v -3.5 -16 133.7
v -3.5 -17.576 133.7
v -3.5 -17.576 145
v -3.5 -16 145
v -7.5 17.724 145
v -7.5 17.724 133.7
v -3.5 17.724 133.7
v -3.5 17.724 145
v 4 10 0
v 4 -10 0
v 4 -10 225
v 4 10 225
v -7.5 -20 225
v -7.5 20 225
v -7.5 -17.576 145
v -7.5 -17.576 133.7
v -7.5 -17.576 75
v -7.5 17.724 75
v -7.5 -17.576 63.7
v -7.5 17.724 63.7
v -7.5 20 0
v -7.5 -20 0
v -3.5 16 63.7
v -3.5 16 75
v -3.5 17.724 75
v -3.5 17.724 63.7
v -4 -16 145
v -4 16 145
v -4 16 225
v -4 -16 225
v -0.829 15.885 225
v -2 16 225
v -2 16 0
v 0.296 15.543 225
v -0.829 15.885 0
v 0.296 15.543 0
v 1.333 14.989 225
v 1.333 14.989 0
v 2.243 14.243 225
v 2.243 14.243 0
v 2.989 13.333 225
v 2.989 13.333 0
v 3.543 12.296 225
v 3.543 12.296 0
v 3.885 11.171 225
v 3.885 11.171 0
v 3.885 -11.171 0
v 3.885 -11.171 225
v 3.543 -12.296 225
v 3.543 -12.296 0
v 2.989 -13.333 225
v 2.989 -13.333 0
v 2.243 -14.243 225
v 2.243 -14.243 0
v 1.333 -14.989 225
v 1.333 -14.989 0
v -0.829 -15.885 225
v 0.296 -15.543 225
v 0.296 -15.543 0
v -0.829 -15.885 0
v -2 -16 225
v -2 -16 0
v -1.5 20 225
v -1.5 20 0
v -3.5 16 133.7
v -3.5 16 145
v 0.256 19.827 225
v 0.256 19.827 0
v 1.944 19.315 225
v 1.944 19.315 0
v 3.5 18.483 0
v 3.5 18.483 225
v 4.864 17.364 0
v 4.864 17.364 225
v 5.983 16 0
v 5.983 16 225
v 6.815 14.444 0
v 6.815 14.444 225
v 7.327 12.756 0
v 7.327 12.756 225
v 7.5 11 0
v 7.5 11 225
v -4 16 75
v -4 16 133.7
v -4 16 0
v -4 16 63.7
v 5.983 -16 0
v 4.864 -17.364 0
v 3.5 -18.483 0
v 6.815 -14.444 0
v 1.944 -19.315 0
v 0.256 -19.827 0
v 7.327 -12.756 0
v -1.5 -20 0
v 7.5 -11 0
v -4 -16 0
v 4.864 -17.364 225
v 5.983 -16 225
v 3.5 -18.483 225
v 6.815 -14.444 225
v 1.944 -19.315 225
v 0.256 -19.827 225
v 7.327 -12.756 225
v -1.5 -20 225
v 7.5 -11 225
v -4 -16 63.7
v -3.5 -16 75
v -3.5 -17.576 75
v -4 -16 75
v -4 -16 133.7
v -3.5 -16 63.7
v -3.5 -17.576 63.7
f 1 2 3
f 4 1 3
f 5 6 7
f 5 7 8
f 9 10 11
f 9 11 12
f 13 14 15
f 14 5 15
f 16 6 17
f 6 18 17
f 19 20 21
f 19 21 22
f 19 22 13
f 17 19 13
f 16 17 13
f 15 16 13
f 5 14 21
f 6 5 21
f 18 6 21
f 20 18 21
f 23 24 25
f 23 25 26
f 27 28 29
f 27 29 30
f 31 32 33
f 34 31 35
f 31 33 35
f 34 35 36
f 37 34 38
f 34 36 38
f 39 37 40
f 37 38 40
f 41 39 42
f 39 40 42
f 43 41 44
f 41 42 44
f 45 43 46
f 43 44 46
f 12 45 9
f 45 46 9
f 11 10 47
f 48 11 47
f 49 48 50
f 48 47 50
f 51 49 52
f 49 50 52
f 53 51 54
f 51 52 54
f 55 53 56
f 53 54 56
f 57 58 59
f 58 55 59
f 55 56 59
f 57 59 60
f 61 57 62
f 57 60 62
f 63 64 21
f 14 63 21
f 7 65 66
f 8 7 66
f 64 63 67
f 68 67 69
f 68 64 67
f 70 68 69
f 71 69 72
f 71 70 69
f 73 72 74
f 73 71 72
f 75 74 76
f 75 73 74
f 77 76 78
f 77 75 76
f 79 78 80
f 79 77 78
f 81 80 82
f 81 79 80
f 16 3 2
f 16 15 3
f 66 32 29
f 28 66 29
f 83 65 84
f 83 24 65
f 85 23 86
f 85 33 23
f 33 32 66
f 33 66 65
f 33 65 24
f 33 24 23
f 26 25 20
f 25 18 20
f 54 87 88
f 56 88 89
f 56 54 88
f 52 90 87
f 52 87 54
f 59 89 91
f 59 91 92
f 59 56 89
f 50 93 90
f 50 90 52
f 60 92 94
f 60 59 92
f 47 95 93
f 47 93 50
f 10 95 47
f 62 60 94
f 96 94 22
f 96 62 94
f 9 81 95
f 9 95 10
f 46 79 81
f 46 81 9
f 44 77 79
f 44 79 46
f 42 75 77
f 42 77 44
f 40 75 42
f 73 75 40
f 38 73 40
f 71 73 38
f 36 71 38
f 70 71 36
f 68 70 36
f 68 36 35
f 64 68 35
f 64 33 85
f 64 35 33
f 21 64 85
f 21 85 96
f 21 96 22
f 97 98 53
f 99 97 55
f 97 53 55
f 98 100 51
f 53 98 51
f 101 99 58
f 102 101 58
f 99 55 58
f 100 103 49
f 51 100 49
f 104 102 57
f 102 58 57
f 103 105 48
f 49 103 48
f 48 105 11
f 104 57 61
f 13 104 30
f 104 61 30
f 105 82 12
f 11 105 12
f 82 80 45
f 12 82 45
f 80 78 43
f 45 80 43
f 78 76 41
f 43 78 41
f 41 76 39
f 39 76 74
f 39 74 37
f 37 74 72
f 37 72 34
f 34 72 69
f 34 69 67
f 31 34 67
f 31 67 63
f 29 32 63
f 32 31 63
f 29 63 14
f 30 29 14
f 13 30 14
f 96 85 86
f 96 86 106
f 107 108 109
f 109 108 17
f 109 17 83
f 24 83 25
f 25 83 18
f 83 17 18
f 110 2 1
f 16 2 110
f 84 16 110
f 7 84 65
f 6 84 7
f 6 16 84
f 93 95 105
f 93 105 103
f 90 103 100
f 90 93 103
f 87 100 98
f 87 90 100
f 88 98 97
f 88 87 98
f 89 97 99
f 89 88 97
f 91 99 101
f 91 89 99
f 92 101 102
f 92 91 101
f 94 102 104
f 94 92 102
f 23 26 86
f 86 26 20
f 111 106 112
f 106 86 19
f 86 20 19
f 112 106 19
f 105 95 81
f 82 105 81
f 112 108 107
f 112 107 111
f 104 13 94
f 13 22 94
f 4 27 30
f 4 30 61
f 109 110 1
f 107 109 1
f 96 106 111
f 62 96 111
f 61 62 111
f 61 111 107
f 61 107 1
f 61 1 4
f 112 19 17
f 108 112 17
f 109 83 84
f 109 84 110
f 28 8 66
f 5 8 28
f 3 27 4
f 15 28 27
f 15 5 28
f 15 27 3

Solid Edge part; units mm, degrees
sketch "Sketch1" plane through (0, 0, 0) normal (0, 0, 1) x (1, 0, 0)
  arc A0 (-2, -16) -> (4, -10) centre (-2, -10) ccw
  line L0 (4, -10) -> (4, 10)
  arc A1 (-2, 16) -> (4, 10) centre (-2, 10) cw
  line L1 (-2, 16) -> (-4, 16)
  line L2 (-4, 16) -> (-4, -16)
  line L3 (-4, -16) -> (-2, -16)
  arc A2 (7.5, -11) -> (-1.5, -20) centre (-1.5, -11) cw
  line L4 (-7.5, -20) -> (-1.5, -20)
  line L5 (-7.5, 20) -> (-7.5, -20)
  line L6 (-1.5, 20) -> (-7.5, 20)
  arc A3 (-1.5, 20) -> (7.5, 11) centre (-1.5, 11) cw
  line L7 (7.5, -11) -> (7.5, 11)
  dimension "D1" = 9
  dimension "D2" = 9
  dimension "D3" = 40
  dimension "D4" = 32
extrude "Protrusion1" add sketch "Sketch1" along normal blind 225
sketch "Sketch2" plane through (-7.5, 0, 112.5) normal (-1, 0, 0) x (0, 0, 1)
  line L0 (21.2, 17.7236) -> (32.5, 17.7236)
  line L1 (32.5, 17.7236) -> (32.5, -17.5764)
  line L2 (32.5, -17.5764) -> (21.2, -17.5764)
  line L3 (21.2, -17.5764) -> (21.2, 17.7236)
  line L4 (-48.8, -17.5764) -> (-37.5, -17.5764)
  line L5 (-37.5, -17.5764) -> (-37.5, 17.7236)
  line L6 (-37.5, 17.7236) -> (-48.8, 17.7236)
  line L7 (-48.8, 17.7236) -> (-48.8, -17.5764)
  dimension "D1" = 35.3
  dimension "D2" = 11.3
  dimension "D3" = 80
  dimension "D4" = 70
  dimension "D5" = 11.3
extrude "VaciadoExtruido_5" cut sketch "Sketch2" against normal blind 4
